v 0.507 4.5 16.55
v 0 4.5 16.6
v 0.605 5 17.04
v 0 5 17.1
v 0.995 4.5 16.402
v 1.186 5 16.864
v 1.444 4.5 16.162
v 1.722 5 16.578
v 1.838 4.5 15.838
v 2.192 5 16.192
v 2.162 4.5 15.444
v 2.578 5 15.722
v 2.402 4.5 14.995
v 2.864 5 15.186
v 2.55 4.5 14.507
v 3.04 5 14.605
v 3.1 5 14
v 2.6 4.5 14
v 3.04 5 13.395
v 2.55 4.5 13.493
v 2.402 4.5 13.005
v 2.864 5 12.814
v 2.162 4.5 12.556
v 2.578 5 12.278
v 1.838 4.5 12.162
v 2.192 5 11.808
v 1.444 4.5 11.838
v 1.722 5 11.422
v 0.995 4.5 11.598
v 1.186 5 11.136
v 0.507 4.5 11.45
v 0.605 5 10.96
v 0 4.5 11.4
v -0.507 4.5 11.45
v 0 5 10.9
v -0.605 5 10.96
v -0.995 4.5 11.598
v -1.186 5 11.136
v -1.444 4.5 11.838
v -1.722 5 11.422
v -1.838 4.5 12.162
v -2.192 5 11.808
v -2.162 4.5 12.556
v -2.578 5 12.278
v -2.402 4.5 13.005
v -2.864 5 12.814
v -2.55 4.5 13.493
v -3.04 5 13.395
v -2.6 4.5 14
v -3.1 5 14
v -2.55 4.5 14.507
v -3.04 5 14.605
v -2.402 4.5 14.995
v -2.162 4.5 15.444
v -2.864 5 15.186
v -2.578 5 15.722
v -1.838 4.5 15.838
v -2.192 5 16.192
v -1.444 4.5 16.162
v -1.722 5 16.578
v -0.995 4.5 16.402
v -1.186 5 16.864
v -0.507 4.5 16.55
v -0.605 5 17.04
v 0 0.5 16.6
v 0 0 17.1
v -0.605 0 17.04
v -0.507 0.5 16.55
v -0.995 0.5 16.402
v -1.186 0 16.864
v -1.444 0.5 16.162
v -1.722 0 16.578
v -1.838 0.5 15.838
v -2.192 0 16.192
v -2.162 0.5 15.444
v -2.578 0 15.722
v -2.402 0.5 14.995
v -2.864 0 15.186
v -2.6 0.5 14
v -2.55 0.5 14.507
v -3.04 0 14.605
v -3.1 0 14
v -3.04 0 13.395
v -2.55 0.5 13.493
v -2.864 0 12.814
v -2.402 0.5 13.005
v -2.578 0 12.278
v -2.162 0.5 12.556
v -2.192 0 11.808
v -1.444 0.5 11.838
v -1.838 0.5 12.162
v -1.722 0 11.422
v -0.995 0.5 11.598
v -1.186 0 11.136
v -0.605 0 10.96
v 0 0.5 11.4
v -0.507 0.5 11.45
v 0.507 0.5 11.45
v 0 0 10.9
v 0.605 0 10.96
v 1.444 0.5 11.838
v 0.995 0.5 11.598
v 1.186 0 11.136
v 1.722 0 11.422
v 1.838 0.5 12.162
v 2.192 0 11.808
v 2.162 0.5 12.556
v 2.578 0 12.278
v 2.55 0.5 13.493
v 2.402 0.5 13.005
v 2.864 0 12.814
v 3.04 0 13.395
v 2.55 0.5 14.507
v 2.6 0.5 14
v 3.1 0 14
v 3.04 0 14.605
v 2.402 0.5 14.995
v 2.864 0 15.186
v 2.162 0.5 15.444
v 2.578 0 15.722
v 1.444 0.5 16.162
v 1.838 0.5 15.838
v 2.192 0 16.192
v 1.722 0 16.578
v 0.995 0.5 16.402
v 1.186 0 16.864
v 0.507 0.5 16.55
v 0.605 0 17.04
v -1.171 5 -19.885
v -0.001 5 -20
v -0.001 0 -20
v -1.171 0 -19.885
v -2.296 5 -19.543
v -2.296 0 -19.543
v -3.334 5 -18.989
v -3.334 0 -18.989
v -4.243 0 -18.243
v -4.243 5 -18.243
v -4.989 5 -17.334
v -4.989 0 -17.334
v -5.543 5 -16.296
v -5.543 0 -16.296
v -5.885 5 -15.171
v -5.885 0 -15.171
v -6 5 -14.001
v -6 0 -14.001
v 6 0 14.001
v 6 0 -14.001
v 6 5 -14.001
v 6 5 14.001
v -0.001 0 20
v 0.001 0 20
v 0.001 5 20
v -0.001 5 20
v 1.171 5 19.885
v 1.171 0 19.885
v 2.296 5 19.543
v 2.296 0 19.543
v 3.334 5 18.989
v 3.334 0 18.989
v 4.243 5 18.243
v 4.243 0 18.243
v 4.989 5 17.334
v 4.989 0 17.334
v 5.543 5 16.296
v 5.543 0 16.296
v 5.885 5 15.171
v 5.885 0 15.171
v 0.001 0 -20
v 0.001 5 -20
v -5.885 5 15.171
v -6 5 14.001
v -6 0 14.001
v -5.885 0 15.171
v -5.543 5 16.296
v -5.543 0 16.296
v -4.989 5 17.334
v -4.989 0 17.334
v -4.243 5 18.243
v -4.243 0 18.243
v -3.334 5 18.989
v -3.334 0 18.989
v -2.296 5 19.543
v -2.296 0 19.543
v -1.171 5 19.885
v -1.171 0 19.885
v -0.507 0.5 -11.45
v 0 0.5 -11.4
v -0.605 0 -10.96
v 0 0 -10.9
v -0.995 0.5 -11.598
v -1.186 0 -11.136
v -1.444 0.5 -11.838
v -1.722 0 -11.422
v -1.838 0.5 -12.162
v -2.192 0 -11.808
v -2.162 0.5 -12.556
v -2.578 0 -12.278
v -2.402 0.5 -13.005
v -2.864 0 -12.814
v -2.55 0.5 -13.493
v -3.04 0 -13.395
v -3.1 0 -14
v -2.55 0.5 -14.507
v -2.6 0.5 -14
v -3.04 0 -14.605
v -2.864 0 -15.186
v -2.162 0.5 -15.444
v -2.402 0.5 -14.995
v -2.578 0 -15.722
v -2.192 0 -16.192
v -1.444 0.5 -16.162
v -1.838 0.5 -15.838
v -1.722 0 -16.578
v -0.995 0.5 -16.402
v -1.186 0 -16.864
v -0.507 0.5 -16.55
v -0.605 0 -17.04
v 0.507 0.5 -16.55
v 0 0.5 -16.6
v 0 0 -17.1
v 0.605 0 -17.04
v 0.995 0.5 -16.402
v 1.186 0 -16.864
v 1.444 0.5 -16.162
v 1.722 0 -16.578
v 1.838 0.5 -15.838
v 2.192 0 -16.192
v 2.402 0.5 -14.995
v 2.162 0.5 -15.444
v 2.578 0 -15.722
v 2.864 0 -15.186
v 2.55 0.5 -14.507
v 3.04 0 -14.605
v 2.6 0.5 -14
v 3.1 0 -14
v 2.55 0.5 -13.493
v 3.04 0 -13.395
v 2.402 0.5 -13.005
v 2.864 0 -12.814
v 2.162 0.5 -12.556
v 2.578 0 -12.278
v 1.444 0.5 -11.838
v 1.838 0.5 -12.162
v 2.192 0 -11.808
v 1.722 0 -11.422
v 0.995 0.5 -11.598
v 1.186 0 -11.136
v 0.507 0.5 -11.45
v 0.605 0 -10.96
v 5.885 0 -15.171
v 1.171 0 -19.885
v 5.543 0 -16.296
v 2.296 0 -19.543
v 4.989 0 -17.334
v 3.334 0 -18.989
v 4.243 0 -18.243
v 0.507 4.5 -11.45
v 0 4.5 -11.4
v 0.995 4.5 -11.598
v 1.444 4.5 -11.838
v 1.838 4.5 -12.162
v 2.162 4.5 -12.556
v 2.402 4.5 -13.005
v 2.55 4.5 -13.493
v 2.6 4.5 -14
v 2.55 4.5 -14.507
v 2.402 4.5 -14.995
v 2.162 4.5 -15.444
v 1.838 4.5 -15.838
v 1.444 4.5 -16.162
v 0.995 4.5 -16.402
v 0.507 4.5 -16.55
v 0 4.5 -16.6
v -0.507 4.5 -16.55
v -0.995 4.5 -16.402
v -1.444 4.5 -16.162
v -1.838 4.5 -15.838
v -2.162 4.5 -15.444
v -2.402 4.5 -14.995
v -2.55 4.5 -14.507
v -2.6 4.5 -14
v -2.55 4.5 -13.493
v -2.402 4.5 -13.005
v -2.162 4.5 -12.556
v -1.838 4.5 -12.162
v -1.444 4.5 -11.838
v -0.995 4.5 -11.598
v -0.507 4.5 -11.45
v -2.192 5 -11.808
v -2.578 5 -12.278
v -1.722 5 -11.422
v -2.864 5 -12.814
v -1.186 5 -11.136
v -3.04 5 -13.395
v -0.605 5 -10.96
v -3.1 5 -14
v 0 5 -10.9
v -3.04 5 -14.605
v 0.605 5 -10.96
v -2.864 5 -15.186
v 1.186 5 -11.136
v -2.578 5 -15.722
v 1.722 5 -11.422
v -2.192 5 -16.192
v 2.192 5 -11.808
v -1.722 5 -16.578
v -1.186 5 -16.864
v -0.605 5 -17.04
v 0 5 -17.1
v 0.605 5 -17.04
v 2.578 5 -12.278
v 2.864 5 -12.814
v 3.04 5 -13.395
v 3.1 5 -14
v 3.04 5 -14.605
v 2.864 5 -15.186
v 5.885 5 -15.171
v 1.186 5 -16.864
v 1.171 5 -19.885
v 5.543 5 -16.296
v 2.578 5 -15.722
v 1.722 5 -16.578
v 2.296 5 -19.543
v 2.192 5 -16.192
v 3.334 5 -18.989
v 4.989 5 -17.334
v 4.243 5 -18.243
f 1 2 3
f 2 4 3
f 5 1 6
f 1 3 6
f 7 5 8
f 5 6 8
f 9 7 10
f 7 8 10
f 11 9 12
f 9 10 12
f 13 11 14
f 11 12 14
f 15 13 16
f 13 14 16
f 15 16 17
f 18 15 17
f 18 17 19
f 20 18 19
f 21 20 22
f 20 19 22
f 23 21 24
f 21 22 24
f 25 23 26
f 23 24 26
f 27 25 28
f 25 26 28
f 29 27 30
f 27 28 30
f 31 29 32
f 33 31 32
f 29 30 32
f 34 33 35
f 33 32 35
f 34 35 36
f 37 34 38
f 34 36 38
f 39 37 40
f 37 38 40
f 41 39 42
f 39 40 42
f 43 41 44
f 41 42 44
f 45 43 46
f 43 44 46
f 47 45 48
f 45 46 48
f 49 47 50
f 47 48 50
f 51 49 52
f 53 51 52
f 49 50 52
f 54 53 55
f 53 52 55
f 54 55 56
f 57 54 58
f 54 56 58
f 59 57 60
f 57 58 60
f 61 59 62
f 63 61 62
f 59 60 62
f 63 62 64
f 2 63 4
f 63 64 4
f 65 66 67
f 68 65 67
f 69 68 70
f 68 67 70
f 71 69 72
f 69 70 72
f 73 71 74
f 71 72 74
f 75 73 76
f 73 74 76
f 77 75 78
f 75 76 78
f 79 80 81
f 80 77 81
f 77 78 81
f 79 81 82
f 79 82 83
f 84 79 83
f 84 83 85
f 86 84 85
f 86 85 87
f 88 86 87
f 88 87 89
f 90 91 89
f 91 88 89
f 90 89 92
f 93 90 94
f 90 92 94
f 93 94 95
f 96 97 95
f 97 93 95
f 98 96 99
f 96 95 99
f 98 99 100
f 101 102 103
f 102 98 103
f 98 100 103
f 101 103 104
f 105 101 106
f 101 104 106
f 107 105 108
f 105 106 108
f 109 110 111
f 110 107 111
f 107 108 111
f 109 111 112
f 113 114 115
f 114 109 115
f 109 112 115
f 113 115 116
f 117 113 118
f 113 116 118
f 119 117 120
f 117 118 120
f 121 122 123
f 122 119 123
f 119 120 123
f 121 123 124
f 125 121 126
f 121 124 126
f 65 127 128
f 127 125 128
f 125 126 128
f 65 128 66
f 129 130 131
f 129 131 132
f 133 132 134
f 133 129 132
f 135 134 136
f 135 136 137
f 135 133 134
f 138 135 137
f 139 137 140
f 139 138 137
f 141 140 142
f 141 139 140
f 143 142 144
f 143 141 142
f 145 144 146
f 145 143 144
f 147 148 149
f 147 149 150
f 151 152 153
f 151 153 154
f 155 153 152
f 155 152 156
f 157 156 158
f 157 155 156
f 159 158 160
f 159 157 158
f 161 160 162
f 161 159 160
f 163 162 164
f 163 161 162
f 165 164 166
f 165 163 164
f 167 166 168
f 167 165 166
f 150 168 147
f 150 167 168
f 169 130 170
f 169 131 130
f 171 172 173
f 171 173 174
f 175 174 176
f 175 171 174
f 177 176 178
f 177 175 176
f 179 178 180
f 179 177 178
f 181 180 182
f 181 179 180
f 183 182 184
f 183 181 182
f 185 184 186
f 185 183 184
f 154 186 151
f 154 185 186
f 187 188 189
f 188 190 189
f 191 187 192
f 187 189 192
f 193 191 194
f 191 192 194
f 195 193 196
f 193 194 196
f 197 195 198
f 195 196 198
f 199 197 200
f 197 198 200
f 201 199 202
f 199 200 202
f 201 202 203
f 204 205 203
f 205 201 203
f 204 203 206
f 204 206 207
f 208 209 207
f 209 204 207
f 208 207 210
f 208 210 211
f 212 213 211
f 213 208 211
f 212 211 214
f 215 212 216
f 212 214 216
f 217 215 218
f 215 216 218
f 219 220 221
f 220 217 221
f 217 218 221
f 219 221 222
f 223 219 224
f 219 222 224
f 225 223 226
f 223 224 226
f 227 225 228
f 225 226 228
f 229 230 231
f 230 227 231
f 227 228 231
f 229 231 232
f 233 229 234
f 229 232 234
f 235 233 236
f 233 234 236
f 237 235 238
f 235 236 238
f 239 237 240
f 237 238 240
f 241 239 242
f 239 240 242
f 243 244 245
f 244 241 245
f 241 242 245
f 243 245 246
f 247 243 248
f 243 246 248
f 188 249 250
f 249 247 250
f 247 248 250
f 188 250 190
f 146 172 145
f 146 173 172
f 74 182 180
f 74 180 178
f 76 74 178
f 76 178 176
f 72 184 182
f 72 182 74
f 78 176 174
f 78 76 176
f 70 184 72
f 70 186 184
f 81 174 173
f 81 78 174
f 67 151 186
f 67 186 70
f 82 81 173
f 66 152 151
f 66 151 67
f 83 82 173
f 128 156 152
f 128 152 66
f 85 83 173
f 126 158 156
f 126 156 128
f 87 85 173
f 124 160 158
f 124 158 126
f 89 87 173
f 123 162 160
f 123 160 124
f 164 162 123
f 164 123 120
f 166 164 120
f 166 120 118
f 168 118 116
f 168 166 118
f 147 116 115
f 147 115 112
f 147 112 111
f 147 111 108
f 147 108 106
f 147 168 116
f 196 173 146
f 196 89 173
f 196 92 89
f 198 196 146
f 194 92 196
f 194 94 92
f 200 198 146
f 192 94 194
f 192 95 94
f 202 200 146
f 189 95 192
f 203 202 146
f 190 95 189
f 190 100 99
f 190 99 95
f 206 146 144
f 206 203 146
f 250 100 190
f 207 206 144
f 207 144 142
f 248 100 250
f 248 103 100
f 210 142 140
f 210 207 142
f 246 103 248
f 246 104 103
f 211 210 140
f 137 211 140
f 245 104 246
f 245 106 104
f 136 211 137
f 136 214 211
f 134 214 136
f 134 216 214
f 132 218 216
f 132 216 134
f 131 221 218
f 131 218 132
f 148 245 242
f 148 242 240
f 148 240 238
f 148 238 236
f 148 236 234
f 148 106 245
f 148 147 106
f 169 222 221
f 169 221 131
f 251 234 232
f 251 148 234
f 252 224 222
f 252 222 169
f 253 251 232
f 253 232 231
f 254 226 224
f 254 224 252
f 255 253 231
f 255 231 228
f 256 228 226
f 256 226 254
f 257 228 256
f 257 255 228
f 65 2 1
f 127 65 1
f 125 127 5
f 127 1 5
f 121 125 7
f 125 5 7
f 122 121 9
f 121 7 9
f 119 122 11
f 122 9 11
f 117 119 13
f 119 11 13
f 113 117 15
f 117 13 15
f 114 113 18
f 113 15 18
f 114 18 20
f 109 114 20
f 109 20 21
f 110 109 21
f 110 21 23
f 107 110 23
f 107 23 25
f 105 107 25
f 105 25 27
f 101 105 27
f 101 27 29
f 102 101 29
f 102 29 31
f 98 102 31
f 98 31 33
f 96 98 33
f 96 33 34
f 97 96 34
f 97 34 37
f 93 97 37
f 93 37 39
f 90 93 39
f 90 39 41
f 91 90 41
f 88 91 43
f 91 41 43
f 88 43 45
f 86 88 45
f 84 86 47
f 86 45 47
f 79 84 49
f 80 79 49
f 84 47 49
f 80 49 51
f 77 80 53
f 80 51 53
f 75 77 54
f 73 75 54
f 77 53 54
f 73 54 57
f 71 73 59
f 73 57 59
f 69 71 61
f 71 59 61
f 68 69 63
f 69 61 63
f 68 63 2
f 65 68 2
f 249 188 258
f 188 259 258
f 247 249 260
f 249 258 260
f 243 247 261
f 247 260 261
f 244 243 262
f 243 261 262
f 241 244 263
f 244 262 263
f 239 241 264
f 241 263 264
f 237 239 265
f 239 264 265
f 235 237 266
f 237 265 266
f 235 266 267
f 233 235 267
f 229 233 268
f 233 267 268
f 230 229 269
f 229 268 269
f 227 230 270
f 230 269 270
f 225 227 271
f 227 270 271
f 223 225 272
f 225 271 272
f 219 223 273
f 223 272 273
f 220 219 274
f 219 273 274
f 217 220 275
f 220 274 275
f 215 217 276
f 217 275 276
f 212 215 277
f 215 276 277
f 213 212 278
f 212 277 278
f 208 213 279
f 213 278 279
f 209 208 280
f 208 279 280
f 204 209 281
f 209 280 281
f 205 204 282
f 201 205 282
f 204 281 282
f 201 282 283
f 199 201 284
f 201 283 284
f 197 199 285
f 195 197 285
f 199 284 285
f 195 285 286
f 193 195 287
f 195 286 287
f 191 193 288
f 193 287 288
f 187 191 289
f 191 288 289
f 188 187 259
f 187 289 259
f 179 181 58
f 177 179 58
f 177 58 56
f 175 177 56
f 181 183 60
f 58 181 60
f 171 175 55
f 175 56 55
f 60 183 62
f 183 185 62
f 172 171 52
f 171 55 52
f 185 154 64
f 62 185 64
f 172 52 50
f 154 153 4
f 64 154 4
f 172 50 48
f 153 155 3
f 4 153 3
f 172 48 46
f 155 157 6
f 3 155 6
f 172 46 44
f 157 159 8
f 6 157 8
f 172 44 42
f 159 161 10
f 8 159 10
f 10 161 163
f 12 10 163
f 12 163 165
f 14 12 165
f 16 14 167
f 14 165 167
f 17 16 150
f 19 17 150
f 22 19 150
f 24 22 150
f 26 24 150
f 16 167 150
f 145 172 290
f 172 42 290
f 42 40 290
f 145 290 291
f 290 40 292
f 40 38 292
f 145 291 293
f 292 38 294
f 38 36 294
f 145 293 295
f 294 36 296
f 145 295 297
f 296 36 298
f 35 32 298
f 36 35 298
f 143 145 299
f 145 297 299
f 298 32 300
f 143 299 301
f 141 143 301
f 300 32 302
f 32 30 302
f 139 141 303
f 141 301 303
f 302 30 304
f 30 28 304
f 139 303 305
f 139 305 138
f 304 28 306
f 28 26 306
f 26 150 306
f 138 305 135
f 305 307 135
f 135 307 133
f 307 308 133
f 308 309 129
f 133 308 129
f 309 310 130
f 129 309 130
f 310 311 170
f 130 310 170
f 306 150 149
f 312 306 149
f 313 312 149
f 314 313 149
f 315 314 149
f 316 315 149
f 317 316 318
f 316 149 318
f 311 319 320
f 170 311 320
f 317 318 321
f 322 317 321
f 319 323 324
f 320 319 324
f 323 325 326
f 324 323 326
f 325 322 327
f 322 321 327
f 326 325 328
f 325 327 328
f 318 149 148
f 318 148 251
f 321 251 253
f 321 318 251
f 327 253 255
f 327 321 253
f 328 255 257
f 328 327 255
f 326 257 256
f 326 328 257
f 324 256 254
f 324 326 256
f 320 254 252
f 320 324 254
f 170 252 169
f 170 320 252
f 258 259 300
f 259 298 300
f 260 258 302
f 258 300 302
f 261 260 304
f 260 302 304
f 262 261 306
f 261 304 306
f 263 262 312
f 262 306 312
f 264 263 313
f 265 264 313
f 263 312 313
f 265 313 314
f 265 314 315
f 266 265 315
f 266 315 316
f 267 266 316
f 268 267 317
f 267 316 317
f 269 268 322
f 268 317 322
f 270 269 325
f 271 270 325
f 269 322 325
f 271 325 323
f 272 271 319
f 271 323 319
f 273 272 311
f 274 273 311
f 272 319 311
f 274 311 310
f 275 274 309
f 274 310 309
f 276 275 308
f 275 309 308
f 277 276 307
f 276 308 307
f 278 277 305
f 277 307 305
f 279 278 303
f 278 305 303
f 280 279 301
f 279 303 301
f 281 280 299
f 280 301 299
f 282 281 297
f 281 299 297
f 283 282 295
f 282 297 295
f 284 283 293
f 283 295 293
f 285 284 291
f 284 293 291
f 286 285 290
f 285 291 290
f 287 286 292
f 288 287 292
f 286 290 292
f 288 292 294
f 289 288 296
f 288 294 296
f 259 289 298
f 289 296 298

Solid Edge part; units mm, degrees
sketch "Sketch1" plane through (0, 0, 0) normal (0, -1, 0) x (1, 0, 0)
  line L0 (-6, -20) -> (6, -20)
  line L1 (6, -20) -> (6, 20)
  line L2 (6, 20) -> (-6, 20)
  line L3 (-6, 20) -> (-6, -20)
  dimension "D1" = 12
  dimension "D2" = 40
extrude "Protrusion1" add sketch "Sketch1" against normal blind 5
fillet "Verrundung_3" radius 6 4 edges at (-6, 2.5, 20) (6, 2.5, 20) (-6, 2.5, -20) (6, 2.5, -20)
sketch "Sketch2" plane through (0, 5, 0) normal (0, 1, 0) x (0, 0, 1)
  circle A0 centre (-14, 0) radius 2.6
  circle A1 centre (14, 0) radius 2.6
  dimension "D1" = 5.2
extrude "Cutout1" cut sketch "Sketch2" against normal through all
chamfer "Chamfer1" distance 0.5 angle 45 3 edges at (0, 5, -16.6) (0, 0, 16.6) (0, 0, -11.4)
chamfer "Fase_7" distance 0.5 angle 45 1 edges at (0, 5, 11.4)
properties material "Nylon, allgemein"
